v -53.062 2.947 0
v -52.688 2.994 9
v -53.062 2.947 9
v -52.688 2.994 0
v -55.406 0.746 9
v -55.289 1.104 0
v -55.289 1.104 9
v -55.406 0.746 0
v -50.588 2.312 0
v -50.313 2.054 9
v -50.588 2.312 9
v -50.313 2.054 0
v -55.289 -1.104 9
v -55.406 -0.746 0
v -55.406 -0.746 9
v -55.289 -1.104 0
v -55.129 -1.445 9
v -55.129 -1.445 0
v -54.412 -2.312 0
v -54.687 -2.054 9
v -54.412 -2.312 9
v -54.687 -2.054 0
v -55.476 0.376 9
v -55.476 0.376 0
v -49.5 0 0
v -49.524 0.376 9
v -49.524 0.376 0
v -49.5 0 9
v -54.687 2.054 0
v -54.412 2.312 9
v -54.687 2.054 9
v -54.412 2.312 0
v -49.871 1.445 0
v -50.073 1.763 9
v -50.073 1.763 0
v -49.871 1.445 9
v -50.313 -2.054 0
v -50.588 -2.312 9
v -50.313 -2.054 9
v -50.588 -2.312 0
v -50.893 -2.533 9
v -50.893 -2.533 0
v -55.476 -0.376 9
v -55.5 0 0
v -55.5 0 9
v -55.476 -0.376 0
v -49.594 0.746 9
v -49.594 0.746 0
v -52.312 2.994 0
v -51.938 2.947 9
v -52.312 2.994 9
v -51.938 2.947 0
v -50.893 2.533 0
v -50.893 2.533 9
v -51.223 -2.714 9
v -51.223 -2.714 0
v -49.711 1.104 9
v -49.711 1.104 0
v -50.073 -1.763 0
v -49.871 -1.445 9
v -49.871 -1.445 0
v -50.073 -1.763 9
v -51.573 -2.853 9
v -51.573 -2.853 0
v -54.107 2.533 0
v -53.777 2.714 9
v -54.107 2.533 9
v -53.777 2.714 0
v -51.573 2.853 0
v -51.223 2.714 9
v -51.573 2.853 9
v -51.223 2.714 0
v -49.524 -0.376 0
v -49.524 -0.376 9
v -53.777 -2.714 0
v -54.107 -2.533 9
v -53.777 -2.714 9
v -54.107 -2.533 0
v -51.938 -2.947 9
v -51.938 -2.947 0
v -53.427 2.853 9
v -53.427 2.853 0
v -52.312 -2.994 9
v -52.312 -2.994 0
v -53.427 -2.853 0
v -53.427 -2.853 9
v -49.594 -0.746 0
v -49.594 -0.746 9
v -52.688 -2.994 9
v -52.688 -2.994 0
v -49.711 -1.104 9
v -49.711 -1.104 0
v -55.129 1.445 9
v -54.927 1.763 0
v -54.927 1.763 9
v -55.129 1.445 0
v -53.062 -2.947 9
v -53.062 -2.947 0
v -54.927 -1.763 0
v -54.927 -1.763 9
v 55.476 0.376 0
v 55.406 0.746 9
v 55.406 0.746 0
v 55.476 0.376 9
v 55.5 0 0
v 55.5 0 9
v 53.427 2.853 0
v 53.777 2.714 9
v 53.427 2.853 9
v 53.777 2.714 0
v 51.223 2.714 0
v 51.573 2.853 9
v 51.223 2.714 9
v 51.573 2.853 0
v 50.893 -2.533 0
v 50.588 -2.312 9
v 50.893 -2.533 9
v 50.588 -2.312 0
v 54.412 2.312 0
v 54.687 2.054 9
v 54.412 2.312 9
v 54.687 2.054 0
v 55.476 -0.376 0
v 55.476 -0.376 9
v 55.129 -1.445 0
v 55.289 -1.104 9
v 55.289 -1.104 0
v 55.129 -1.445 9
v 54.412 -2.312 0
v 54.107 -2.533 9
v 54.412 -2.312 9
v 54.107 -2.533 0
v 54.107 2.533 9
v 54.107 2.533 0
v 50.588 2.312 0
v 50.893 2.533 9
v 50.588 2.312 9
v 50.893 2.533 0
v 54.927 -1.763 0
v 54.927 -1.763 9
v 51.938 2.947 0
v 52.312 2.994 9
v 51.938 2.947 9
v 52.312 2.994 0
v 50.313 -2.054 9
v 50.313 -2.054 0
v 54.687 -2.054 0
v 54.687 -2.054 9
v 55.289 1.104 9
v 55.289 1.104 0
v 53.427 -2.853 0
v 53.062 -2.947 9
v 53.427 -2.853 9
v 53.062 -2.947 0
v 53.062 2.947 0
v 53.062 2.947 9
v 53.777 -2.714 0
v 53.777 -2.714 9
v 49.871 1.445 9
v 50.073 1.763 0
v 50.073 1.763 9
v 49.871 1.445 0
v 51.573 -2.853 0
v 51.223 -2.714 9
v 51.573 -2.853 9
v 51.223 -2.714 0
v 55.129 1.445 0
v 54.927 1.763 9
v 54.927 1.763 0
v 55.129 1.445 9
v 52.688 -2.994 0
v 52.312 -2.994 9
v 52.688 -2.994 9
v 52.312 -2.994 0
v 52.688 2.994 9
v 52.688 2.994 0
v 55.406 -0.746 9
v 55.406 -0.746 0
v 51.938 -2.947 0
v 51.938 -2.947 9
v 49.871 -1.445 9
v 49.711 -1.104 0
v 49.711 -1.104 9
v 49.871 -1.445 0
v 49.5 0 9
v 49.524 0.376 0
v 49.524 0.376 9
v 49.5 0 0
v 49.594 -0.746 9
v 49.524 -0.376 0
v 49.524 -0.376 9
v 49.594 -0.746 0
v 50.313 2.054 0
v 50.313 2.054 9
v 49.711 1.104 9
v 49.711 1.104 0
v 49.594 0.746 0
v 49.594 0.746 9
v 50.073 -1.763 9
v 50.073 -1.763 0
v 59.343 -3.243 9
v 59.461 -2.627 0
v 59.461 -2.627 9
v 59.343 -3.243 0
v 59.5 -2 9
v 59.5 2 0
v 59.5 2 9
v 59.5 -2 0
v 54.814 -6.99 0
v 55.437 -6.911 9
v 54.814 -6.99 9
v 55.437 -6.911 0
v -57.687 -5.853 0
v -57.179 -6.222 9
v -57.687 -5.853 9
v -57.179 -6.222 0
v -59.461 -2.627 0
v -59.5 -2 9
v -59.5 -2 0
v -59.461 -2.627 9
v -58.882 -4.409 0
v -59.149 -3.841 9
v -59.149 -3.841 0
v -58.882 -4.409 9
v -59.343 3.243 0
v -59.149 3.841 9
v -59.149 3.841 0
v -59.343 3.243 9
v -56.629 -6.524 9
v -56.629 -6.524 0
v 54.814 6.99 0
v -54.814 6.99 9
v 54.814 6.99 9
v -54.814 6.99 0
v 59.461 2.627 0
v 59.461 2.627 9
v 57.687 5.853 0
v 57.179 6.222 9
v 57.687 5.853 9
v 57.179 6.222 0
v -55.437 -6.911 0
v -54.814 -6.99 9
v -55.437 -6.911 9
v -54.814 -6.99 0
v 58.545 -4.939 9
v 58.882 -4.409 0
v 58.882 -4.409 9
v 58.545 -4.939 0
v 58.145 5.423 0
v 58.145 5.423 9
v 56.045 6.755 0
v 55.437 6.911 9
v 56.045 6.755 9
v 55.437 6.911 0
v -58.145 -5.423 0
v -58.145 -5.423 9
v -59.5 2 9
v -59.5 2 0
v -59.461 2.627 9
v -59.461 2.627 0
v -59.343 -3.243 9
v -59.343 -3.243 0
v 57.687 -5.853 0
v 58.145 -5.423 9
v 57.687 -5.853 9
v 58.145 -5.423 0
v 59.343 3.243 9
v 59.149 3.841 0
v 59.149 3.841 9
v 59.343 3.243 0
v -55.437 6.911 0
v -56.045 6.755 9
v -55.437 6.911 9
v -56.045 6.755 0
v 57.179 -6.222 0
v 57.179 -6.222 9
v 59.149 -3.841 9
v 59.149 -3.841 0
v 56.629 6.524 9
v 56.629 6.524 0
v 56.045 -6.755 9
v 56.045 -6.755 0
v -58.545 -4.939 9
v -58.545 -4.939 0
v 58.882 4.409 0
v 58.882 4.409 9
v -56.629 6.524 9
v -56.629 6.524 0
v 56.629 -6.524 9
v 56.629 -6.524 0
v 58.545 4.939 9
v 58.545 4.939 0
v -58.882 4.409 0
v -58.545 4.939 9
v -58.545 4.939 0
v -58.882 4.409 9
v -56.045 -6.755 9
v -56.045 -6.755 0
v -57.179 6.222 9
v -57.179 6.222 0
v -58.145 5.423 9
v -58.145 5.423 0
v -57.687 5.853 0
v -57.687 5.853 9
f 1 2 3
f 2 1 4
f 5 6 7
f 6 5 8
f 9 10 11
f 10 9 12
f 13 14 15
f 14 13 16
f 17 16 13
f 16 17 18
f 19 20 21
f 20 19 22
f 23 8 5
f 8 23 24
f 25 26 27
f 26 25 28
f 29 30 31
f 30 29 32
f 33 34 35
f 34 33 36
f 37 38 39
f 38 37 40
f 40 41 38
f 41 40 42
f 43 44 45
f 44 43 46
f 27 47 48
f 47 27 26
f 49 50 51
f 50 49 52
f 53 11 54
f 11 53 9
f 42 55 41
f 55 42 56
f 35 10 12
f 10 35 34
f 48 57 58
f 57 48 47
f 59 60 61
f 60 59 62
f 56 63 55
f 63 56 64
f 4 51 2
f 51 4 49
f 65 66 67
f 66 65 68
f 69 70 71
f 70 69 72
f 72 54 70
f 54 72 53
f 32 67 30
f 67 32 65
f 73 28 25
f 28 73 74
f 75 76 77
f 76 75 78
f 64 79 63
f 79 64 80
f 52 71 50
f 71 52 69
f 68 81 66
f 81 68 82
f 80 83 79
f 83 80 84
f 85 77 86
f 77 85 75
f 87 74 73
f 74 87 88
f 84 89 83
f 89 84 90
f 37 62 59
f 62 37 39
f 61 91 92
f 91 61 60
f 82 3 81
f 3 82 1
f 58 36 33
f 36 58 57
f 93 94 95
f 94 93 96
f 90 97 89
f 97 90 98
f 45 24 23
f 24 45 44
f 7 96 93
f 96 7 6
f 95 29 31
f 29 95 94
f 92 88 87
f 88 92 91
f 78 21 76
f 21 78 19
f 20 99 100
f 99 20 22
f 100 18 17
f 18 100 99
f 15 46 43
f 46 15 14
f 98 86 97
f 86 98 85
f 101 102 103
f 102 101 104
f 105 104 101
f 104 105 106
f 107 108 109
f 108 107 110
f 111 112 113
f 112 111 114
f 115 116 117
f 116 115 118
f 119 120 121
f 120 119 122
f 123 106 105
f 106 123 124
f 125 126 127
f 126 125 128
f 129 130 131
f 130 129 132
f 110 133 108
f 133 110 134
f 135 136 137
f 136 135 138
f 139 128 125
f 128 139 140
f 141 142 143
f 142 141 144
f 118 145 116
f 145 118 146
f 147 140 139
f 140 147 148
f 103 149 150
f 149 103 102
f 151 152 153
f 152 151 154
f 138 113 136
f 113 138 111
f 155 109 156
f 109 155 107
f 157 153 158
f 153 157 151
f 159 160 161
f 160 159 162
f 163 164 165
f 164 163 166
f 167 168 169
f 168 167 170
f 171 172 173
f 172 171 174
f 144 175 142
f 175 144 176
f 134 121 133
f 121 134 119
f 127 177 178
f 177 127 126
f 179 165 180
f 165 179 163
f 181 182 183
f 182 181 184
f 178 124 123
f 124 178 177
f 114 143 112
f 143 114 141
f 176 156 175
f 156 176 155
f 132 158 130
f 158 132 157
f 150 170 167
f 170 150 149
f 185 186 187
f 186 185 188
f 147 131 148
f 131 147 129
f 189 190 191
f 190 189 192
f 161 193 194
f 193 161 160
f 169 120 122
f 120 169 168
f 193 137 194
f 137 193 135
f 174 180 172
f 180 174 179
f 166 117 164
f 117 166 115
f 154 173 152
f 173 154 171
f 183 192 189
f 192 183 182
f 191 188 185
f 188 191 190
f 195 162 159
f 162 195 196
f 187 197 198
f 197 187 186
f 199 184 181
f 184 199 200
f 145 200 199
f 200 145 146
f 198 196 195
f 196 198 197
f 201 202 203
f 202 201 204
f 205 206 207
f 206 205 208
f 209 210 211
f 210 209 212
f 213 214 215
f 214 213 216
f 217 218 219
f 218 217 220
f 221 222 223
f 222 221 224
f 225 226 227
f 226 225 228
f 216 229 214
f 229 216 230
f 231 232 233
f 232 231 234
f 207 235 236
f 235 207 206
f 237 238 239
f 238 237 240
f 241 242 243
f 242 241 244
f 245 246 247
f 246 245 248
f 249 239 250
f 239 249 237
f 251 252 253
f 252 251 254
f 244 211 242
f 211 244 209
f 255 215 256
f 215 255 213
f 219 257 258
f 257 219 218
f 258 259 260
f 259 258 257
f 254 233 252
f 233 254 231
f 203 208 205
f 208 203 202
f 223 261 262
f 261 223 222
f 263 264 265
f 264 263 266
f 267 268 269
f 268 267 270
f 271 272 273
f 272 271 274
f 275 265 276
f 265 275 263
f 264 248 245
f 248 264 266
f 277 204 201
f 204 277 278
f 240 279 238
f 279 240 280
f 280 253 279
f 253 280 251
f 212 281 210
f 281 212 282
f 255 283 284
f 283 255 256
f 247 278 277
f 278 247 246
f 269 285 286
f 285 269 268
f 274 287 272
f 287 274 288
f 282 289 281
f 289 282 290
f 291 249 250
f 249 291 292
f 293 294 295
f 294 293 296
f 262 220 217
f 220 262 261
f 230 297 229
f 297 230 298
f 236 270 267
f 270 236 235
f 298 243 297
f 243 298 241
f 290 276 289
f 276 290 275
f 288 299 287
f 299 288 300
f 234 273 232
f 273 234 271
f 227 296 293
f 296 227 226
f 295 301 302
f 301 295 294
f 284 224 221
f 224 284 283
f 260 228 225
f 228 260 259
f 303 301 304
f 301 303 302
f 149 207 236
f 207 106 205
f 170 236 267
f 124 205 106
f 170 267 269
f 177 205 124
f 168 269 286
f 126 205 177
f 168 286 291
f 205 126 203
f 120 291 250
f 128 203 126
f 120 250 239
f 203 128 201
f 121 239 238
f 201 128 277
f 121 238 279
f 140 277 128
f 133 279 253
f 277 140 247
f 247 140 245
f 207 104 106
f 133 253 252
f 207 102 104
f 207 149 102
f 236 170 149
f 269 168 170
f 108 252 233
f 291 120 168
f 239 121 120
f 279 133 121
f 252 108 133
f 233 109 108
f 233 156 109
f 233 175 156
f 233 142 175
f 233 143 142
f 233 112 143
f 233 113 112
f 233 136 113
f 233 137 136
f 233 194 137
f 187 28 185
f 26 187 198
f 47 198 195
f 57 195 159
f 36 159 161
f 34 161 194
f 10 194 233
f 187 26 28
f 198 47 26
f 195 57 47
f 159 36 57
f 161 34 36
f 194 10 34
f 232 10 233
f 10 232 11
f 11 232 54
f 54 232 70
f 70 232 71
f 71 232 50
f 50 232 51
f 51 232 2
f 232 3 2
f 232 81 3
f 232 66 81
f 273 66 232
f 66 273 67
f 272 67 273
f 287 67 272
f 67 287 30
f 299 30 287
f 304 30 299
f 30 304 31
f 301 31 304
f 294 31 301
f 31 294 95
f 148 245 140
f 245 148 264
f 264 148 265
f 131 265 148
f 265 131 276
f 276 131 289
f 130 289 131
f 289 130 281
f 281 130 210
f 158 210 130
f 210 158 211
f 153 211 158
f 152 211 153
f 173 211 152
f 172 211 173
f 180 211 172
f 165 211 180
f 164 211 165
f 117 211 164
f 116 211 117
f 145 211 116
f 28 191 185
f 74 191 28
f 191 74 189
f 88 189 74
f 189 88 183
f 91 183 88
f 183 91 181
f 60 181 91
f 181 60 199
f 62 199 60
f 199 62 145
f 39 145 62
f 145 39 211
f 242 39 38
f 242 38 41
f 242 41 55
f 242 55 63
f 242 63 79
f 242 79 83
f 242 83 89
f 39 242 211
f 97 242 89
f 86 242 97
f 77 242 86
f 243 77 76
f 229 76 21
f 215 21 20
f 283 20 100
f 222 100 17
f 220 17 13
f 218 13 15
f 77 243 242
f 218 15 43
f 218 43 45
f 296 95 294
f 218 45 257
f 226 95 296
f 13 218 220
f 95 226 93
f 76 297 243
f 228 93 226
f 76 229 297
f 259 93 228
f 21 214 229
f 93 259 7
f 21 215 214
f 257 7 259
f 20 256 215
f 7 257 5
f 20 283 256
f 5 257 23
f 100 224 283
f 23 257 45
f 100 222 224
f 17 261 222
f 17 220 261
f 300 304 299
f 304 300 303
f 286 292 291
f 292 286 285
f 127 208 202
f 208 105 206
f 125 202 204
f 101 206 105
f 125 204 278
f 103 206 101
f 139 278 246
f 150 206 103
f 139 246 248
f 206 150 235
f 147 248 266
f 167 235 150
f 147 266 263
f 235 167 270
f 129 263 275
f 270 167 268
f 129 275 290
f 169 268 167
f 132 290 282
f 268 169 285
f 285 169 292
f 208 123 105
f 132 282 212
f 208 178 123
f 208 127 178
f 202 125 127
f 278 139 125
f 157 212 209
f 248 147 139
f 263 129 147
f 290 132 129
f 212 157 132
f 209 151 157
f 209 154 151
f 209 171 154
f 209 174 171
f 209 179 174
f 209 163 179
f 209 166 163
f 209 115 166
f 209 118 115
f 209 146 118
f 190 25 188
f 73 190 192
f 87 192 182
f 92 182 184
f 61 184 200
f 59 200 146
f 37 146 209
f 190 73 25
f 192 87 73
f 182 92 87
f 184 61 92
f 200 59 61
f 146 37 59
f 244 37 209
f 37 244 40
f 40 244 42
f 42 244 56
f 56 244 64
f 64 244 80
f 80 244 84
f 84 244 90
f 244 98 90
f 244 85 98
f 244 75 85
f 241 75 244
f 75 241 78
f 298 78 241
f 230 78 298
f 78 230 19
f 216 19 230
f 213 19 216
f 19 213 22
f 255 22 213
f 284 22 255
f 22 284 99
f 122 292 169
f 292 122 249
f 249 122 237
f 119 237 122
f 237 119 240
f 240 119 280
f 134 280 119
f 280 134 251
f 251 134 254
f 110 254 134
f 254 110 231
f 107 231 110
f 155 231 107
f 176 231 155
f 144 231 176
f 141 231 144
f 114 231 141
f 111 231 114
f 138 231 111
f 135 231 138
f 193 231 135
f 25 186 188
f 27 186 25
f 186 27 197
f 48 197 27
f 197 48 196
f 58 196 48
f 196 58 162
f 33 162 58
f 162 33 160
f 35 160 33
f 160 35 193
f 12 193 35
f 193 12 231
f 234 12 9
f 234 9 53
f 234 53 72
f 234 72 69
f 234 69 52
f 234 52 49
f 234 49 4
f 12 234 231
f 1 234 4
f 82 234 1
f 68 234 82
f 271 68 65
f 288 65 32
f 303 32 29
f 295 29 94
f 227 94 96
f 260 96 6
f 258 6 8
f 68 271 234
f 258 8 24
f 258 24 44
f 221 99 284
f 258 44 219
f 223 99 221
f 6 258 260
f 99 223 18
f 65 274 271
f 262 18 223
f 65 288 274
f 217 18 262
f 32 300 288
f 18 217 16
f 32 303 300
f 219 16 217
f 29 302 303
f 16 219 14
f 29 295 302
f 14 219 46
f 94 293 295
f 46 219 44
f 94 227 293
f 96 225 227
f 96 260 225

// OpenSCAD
$fn = 50;


difference() {
	union() {
		hull() {
			translate(v = [-54.5000000000, 2.0000000000, 0]) {
				cylinder(h = 9, r = 5);
			}
			translate(v = [54.5000000000, 2.0000000000, 0]) {
				cylinder(h = 9, r = 5);
			}
			translate(v = [-54.5000000000, -2.0000000000, 0]) {
				cylinder(h = 9, r = 5);
			}
			translate(v = [54.5000000000, -2.0000000000, 0]) {
				cylinder(h = 9, r = 5);
			}
		}
	}
	union() {
		translate(v = [-52.5000000000, 0.0000000000, -100.0000000000]) {
			cylinder(h = 200, r = 3.0000000000);
		}
		translate(v = [-52.5000000000, 0.0000000000, -100.0000000000]) {
			cylinder(h = 200, r = 3.0000000000);
		}
		translate(v = [52.5000000000, 0.0000000000, -100.0000000000]) {
			cylinder(h = 200, r = 3.0000000000);
		}
		translate(v = [52.5000000000, 0.0000000000, -100.0000000000]) {
			cylinder(h = 200, r = 3.0000000000);
		}
	}
}
